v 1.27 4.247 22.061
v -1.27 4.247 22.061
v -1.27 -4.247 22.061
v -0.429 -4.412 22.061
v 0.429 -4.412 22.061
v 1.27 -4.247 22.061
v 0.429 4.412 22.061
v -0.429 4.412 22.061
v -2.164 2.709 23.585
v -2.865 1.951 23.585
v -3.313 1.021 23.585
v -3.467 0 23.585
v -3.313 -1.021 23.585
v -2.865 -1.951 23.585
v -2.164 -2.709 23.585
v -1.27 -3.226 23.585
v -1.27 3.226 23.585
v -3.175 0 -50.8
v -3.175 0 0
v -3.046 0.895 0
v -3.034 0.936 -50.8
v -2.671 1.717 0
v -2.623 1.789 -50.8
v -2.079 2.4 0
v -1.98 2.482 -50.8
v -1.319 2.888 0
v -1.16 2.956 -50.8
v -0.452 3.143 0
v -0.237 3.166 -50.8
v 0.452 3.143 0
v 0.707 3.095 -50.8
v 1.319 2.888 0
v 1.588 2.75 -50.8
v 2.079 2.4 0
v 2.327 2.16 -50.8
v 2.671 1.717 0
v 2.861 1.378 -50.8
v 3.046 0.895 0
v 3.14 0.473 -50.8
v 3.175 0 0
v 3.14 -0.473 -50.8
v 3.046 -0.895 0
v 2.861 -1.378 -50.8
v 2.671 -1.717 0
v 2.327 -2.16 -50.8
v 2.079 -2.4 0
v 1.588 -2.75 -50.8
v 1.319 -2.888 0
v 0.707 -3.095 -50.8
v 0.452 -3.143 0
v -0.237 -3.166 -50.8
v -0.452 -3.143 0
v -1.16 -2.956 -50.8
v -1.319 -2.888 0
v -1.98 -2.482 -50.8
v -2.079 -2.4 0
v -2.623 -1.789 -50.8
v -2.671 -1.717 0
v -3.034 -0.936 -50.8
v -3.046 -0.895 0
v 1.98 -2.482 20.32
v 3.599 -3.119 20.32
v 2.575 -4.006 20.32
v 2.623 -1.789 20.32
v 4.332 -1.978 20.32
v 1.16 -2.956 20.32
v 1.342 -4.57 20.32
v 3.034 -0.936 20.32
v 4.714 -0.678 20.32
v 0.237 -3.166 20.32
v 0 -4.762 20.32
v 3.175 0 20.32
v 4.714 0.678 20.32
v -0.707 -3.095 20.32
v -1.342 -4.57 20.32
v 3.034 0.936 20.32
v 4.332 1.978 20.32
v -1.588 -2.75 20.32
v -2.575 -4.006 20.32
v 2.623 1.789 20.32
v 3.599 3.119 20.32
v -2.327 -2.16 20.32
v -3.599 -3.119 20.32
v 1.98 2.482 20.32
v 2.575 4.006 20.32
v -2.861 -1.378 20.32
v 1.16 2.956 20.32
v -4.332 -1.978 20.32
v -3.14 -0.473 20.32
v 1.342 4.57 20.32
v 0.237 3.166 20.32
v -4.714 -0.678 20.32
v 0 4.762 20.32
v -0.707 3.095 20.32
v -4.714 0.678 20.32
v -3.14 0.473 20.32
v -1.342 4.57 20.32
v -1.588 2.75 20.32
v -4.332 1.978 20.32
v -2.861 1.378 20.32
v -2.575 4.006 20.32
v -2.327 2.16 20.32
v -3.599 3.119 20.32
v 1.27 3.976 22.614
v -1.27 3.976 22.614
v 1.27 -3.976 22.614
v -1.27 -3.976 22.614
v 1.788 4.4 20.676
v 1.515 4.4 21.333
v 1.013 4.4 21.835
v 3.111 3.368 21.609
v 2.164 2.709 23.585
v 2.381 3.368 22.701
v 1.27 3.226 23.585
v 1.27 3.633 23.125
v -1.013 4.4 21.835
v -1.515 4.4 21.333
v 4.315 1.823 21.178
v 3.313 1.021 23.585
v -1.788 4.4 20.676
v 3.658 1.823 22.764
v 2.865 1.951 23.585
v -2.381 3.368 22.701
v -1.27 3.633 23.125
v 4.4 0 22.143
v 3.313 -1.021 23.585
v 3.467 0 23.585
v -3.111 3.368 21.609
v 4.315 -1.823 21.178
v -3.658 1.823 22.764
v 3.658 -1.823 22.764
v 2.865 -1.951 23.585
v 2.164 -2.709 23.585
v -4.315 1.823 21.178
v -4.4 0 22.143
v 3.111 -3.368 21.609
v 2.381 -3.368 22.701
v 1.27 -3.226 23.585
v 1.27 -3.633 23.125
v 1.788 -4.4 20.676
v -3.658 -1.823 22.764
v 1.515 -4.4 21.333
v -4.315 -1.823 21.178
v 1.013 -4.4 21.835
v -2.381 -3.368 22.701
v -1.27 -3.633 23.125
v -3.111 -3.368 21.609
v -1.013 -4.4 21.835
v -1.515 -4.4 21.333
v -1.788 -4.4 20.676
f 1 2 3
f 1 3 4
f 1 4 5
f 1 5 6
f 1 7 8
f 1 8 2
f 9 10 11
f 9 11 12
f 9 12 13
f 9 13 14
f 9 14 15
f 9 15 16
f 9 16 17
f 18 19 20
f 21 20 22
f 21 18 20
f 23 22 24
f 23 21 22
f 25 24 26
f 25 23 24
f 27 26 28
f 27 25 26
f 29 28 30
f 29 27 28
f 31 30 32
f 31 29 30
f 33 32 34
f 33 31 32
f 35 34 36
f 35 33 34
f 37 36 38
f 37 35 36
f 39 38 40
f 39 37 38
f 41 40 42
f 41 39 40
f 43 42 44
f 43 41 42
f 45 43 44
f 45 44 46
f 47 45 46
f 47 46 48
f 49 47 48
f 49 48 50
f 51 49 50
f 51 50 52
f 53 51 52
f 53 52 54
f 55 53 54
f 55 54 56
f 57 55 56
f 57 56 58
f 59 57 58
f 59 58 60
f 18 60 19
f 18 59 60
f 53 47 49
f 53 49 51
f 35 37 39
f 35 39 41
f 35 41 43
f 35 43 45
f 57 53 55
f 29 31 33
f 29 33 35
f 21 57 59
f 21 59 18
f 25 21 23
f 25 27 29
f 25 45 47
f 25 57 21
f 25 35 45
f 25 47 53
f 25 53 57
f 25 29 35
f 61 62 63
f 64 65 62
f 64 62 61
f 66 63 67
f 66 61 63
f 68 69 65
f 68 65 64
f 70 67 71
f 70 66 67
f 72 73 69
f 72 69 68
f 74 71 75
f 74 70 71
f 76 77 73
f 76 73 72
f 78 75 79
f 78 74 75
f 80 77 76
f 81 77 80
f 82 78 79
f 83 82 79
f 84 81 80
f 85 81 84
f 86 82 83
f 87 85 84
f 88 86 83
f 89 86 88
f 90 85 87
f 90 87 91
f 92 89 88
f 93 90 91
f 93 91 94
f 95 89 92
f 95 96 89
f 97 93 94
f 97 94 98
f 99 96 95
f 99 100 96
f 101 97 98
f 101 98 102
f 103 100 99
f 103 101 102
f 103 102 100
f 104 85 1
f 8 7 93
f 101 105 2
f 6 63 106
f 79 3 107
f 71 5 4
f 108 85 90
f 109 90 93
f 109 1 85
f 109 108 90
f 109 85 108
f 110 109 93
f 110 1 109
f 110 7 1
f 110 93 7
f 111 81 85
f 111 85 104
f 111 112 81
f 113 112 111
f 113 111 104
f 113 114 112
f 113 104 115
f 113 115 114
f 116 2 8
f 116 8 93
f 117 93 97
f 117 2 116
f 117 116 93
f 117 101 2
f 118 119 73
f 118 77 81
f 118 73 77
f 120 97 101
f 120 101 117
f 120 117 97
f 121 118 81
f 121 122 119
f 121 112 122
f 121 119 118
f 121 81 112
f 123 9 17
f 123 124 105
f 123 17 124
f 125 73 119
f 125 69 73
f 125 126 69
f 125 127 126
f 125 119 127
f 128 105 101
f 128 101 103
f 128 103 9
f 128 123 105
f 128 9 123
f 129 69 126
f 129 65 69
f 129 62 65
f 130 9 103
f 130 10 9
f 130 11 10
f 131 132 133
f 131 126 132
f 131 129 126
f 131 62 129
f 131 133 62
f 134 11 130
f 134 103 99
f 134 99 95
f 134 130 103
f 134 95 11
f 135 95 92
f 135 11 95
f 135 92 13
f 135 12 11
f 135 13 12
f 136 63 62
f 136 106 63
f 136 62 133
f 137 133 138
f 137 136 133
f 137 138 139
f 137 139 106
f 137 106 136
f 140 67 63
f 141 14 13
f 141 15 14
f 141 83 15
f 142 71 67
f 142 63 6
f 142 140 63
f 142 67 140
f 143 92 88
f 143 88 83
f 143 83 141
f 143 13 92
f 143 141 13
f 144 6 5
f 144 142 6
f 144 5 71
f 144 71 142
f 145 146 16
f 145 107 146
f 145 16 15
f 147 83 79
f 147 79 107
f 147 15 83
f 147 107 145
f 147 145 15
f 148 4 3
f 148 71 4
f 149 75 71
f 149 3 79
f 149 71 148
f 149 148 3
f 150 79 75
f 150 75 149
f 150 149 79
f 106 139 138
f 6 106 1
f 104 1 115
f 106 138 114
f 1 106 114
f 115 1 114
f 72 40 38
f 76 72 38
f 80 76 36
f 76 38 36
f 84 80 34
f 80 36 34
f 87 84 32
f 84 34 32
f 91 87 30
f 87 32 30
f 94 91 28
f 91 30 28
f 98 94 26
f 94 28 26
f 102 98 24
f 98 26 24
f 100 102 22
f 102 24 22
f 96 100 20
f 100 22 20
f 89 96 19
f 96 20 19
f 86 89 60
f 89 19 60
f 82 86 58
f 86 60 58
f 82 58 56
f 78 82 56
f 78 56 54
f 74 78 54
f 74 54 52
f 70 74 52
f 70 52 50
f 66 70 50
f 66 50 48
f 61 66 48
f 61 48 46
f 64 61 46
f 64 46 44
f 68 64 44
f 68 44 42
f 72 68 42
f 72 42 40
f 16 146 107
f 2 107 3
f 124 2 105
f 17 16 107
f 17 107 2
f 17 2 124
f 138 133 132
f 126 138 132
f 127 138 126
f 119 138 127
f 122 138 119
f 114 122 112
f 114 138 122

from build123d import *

# Parameters (mm, degrees)
SKETCH1_R               = 3.175
BOSS_EXTRUDE1_DEPTH     = 20.32
REVOLVE1_ANGLE          = 180
CUT_EXTRUDE1_DEPTH      = 8.382
CUT_EXTRUDE1_DEPTH_BACK = 9.398
SKETCH3_W               = 1.756055425
SKETCH3_H               = 11.721669961
SKETCH4_W               = 2.54
SKETCH4_H               = 12.81199514
CUT_EXTRUDE2_DEPTH      = 1.524
BOSS_EXTRUDE2_START     = 50.8
SKETCH5_R               = 3.175
BOSS_EXTRUDE2_DEPTH     = 50.8


with BuildPart() as part:
    # Sketch1 → Boss-Extrude1 (new body)
    with BuildSketch(Plane.XY):
        Circle(SKETCH1_R)
    extrude(amount=BOSS_EXTRUDE1_DEPTH)

    # Sketch2 → Revolve1 (revolve)
    with BuildSketch(Plane.XY.offset(20.32)):
        with BuildLine():
            Line((0, -4.7625), (0, 4.7625))
            ThreePointArc((0, 4.7625), (4.7625, 0), (0, -4.7625))
        make_face()
    revolve(axis=Axis((0, -4.7625, 20.32), (0, -1, 0)), revolution_arc=REVOLVE1_ANGLE)

    # Sketch3 → Cut-Extrude1 (cut, two sides: drawn at the far end of the back side and taken through both)
    with BuildSketch(Plane(origin=(2.54, 0, 0), x_dir=(0, 0, -1), z_dir=(1, 0, 0)).offset(-CUT_EXTRUDE1_DEPTH_BACK)):
        with Locations((-24.463510257, -1.014387128)):
            Rectangle(SKETCH3_W, SKETCH3_H)
    extrude(amount=CUT_EXTRUDE1_DEPTH + CUT_EXTRUDE1_DEPTH_BACK, mode=Mode.SUBTRACT)

    # Sketch4 → Cut-Extrude2 (cut)
    with BuildSketch(Plane.XY.offset(23.585482544)):
        with Locations((0, -0.792879604)):
            Rectangle(SKETCH4_W, SKETCH4_H)
    extrude(amount=-CUT_EXTRUDE2_DEPTH, mode=Mode.SUBTRACT)

    # Sketch5 → Boss-Extrude2 (add)
    with BuildSketch(Plane(origin=(0, 0, 0), x_dir=(-1, 0, 0), z_dir=(0, 0, -1)).offset(BOSS_EXTRUDE2_START)):
        Circle(SKETCH5_R)
    extrude(amount=-BOSS_EXTRUDE2_DEPTH)


solid = part.part
